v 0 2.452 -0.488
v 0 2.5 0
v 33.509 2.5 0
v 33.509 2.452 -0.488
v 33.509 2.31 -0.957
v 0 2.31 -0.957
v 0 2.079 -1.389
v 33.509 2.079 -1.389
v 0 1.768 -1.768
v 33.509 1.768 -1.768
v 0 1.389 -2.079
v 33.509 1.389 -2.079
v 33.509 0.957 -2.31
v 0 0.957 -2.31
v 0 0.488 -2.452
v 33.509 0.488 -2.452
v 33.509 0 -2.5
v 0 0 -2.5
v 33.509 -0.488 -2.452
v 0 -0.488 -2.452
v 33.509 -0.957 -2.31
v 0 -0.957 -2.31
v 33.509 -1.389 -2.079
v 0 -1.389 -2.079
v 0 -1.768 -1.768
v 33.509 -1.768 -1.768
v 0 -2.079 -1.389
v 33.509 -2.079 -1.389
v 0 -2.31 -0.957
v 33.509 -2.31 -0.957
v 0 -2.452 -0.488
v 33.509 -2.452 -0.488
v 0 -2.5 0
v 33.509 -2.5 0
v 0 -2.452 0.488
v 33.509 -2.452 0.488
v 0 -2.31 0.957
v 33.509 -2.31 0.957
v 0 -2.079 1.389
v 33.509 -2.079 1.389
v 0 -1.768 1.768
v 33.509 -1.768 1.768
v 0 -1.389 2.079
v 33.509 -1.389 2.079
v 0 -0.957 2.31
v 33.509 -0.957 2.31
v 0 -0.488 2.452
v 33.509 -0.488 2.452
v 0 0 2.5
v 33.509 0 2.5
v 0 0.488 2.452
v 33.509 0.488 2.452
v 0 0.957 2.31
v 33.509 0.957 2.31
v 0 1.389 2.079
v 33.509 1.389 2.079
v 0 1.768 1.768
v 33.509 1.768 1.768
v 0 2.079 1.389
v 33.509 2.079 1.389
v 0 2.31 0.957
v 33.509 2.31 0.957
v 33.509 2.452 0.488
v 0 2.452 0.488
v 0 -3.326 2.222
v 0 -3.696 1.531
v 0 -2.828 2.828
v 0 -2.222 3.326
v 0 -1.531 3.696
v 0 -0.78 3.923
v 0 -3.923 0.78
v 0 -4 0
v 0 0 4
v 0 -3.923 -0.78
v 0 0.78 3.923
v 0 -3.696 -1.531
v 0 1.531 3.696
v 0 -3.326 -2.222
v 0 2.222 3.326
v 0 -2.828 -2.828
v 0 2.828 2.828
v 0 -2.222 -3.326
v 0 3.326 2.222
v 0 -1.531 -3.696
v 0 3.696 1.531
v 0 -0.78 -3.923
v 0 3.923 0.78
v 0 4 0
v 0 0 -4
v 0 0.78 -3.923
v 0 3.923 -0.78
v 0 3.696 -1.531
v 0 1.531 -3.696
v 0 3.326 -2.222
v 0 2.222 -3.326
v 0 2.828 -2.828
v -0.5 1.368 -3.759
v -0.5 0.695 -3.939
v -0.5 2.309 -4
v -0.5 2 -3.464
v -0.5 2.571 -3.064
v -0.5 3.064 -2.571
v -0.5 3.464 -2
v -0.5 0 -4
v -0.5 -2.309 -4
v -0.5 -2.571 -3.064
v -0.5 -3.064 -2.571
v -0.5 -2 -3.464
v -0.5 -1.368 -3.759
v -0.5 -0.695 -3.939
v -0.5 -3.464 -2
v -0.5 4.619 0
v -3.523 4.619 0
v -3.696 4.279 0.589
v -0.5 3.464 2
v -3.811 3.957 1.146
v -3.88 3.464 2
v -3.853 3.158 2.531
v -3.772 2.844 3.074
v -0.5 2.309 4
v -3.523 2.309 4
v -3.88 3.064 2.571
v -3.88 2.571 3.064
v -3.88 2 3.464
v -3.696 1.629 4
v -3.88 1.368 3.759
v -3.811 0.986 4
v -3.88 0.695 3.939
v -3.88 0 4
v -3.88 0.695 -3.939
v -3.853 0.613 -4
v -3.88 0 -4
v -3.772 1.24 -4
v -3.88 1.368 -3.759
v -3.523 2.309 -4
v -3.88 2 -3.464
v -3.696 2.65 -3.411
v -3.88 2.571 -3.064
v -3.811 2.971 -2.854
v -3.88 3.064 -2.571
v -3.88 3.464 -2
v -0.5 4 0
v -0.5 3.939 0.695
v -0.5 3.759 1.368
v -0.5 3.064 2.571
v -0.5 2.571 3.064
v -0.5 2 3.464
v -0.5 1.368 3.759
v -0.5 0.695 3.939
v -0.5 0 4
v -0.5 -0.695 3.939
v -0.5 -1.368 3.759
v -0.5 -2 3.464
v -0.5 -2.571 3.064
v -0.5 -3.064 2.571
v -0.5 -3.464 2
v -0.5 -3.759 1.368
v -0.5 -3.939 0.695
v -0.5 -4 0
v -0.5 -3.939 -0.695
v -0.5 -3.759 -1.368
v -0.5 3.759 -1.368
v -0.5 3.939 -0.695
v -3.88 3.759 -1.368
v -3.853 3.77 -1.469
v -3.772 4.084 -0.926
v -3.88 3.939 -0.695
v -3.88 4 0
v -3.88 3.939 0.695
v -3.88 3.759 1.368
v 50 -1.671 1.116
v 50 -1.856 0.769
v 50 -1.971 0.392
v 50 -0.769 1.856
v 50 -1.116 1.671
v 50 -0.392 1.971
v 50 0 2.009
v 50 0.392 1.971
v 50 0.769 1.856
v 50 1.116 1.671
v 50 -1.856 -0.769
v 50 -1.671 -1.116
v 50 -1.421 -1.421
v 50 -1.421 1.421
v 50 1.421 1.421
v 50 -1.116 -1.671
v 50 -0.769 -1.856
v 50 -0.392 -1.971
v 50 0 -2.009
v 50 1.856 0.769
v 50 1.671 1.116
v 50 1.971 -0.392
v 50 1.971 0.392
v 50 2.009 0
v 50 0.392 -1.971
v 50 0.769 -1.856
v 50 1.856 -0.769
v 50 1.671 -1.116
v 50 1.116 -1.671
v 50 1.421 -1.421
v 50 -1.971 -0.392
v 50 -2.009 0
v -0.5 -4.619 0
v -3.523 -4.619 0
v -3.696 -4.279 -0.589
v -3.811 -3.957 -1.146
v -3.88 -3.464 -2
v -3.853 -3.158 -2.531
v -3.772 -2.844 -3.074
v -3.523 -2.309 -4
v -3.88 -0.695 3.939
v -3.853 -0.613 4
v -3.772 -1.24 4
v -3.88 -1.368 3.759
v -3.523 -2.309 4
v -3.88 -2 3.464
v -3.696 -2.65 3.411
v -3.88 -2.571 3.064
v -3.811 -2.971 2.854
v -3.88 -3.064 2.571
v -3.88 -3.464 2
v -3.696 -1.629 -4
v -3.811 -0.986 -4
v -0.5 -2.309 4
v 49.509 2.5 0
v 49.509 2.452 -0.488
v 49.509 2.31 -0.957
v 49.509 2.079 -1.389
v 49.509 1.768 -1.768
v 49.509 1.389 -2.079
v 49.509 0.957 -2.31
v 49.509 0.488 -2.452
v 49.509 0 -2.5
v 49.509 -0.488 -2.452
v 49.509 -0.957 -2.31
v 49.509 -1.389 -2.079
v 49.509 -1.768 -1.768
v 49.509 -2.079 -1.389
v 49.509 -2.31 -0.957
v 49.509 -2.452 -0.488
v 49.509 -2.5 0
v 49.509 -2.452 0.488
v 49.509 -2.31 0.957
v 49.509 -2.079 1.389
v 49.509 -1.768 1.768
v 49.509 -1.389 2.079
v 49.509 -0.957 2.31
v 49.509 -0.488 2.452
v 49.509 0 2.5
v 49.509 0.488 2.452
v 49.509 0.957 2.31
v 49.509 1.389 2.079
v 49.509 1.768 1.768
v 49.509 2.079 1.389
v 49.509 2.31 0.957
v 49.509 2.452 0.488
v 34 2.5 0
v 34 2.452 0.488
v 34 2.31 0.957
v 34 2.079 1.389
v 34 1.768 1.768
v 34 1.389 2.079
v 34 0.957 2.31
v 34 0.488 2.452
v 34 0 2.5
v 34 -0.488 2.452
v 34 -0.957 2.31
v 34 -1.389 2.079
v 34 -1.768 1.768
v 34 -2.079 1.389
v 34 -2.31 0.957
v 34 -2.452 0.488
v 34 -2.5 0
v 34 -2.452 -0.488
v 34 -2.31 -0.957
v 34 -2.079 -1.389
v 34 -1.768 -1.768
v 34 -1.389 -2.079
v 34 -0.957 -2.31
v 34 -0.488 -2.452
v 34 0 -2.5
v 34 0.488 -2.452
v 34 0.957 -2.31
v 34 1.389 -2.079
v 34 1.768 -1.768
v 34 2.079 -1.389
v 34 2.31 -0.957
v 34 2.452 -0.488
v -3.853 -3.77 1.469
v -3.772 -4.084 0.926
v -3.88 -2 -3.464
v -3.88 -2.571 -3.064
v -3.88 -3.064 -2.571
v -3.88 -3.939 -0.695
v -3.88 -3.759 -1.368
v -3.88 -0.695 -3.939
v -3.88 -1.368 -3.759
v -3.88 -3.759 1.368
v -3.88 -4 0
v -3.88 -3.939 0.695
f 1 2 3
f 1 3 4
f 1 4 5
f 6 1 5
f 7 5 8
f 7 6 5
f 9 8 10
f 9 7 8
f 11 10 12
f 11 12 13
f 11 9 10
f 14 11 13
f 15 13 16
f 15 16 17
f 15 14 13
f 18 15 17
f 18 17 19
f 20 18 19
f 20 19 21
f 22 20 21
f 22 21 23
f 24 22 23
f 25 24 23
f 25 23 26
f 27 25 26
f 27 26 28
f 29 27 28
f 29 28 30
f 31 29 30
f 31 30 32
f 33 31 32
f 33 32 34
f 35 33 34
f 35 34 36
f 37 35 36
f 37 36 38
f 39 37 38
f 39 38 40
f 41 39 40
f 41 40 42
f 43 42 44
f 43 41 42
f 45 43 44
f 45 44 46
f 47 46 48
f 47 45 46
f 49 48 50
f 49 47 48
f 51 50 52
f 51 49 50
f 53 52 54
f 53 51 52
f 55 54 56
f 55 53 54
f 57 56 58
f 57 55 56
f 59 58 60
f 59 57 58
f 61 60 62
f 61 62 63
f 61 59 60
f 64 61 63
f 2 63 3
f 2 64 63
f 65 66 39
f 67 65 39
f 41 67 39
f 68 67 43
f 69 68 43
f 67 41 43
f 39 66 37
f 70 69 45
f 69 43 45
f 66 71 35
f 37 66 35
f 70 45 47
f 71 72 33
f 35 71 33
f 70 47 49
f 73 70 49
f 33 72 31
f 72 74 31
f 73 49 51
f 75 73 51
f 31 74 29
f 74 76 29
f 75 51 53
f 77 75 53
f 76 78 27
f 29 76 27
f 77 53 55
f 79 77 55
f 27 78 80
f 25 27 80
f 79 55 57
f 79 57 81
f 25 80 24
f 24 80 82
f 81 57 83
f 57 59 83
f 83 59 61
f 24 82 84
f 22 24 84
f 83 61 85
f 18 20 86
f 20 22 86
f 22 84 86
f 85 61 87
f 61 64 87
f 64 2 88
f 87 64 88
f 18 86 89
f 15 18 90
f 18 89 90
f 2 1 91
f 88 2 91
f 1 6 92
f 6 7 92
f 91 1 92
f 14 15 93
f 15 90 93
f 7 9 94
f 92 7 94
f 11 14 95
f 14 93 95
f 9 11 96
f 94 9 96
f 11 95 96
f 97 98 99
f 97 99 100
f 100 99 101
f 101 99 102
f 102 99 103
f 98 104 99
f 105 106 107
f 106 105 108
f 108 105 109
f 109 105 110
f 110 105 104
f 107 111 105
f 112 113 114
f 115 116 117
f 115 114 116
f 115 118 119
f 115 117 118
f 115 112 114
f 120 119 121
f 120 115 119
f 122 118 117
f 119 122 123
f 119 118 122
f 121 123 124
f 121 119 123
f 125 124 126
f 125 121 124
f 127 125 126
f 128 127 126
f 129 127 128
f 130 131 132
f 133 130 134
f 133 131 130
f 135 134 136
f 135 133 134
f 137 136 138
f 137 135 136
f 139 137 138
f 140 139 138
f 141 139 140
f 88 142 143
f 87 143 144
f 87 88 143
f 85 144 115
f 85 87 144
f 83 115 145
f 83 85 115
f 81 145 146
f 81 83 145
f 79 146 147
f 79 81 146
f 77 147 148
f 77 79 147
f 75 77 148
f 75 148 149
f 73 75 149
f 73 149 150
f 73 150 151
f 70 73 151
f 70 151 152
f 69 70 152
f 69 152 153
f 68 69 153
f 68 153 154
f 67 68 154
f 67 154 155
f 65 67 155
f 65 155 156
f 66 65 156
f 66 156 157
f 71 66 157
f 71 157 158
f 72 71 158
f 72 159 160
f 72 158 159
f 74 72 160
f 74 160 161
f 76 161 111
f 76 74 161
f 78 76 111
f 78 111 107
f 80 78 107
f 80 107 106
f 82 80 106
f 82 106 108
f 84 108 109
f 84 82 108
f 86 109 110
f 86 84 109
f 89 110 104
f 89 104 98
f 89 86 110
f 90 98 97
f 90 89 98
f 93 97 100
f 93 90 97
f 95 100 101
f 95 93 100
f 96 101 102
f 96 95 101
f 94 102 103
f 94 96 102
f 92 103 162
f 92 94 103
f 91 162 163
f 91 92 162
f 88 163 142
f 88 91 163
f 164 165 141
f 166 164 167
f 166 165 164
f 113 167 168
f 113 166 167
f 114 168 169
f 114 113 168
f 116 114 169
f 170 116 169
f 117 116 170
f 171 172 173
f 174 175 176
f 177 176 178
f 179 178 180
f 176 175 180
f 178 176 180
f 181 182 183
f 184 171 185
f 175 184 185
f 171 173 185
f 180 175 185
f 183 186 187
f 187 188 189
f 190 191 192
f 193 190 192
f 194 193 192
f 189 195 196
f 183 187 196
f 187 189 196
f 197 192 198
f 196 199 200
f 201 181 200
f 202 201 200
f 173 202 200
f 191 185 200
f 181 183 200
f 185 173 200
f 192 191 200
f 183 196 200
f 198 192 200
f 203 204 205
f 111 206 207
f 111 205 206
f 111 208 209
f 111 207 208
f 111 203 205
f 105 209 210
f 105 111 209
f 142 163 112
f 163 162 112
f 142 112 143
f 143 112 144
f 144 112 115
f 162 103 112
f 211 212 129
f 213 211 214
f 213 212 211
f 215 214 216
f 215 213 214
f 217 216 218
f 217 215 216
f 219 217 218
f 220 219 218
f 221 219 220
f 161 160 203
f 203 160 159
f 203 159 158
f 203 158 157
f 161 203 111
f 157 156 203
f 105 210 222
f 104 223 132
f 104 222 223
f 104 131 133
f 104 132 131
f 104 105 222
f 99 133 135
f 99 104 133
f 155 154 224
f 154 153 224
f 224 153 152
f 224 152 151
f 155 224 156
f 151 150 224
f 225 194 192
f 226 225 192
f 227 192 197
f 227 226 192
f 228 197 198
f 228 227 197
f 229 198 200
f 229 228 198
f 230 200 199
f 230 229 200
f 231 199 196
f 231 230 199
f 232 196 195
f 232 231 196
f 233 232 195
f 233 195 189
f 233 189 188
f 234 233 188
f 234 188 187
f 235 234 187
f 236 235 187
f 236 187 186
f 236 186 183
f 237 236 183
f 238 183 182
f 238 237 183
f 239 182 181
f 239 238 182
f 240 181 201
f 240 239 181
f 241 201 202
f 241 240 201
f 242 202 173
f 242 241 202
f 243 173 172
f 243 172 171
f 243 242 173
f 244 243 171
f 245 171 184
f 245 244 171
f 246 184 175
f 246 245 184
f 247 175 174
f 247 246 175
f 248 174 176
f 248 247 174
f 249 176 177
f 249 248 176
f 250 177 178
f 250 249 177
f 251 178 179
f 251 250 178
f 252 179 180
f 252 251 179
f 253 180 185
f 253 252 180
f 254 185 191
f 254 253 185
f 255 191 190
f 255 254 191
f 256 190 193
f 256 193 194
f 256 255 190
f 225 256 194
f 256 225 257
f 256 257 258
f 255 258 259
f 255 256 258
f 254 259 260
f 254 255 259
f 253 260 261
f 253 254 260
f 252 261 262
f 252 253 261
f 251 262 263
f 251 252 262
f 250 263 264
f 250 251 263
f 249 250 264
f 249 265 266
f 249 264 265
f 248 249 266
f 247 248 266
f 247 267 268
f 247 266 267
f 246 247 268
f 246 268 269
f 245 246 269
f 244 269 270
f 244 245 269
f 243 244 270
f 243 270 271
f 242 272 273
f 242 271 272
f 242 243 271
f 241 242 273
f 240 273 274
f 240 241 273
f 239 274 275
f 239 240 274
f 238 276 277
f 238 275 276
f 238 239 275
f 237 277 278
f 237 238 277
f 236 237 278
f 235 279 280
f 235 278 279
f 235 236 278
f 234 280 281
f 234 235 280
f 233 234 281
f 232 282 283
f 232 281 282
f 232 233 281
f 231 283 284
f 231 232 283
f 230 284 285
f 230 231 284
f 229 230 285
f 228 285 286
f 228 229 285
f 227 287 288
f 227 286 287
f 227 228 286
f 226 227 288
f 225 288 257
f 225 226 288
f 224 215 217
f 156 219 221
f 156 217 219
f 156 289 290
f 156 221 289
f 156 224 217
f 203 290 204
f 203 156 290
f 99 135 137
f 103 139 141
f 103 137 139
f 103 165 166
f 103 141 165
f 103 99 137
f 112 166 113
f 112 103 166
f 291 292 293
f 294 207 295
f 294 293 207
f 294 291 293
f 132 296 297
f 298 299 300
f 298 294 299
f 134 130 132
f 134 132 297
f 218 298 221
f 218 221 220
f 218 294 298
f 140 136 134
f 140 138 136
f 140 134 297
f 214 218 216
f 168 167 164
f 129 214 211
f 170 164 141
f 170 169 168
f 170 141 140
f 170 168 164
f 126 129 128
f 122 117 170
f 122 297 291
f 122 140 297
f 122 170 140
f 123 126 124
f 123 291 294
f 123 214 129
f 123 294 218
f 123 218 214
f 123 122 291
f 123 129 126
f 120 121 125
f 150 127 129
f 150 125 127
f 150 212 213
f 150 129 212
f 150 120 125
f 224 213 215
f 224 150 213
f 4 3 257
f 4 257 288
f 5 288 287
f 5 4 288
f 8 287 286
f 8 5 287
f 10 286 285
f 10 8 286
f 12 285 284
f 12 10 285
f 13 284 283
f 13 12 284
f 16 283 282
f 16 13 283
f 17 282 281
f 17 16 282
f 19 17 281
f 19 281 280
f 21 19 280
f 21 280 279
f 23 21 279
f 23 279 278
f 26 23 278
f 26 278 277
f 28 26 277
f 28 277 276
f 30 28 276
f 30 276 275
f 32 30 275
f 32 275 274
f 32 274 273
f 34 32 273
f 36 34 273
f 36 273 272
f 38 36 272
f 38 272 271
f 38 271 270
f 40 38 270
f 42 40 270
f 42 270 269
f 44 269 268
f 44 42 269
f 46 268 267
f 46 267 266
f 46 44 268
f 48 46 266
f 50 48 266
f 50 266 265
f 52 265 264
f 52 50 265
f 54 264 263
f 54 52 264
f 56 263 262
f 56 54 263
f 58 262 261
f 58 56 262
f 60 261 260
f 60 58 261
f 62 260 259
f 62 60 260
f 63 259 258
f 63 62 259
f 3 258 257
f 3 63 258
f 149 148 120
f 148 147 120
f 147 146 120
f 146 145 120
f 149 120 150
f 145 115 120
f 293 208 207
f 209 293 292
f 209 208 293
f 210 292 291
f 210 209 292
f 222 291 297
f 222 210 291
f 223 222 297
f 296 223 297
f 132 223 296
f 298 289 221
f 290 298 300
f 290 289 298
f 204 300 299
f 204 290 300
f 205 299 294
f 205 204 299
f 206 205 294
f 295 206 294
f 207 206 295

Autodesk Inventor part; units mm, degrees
ref_plane "YZ Plane" through (0, 0, 0) normal (1, 0, 0) x (0, 1, 0)
ref_plane "XZ Plane" through (0, 0, 0) normal (0, 1, 0) x (-1, 0, 0)
sketch "Sketch1" plane through (0, 0, 0) normal (0, 0, 1) x (1, 0, 0)
  line L0 (0, 4) -> (0, 2.5)
  line L1 (34, 2.5) -> (50, 2.5)
  line L2 (50, 2.5) -> (50, 0)
  line L3 (50, 0) -> (-0.5001, 0)
  line L4 (-10.6001, 0) -> (60.1, 0) projected
  line L5 (-0.5001, 0) -> (-0.5001, 4)
  line L6 (-0.5001, 4) -> (0, 4)
  line L7 (34, 2.5) -> (33.5091, 2.5)
  line L8 (33.5091, 2.5) -> (0, 2.5)
  line L9 (0, -0.8) -> (0, 4.8) projected
  dimension "d0" = 50
  dimension "d1" = 16
  dimension "d2" = 5
  dimension "d9" = 0.5001
  dimension "d10" = 8
  dimension "d13" = 0.4909
  dimension "d14" = 5
revolve "Body" add sketch "Sketch1" angle 360 about axis through (50, 0, 0) along (-1, 0, 0)
sketch "Sketch2" plane through (-0.5001, 0, 0) normal (-1, 0, 0) x (0, 0, 1)
  line L0 (0, 4.6188) -> (4, 2.3094)
  line L1 (4, 2.3094) -> (4, -2.3094)
  line L2 (4, -2.3094) -> (0, -4.6188)
  line L3 (0, -4.6188) -> (-4, -2.3094)
  line L4 (-4, -2.3094) -> (-4, 2.3094)
  line L5 (-4, 2.3094) -> (0, 4.6188)
  point P0 (0, 0)
  point P1 (0, 0)
  dimension "d11" = 8
extrude "Head" add sketch "Sketch2" along normal blind 3.38
sketch "Sketch4" plane through (0, 0, 0) normal (0, 0, 1) x (1, 0, 0)
  line L0 (-3.8801, 4) -> (-3.8801, 4.6188)
  line L1 (-3.8801, 4.6188) -> (-3.5228, 4.6188)
  line L2 (-3.5228, 4.6188) -> (-3.8801, 4)
  line L3 (-4.5561, 0) -> (0.1759, 0) projected
  line L4 (-0.5001, 4.6188) -> (-3.8801, 4.6188) projected
  line L5 (-3.8801, 2.3094) -> (-3.8801, 4.6188) projected
  dimension "d5" = 30
  dimension "d19" = 8
revolve "Chamfer1" cut sketch "Sketch4" angle 360 about axis through (-10, 0, 0) along (1, 0, 0)
thread "Thread" size "M5x0.8" class "6g" standard "ISO Metric profile" length 16
chamfer "Chamfer2" distance 0.4908 distance2 0.4909 1 edges at (50, -2.5, 0) measured on face at (50, -0.2955, -1.5537)
ref_plane "Work Plane1" through (1.525, 0, 0) normal (0, 0, 1) x (1, 0, 0)
equation "\"d0\" = NLG"
equation "\"d1\" = GEL"
equation "\"d2\" = GD"
equation "\"d10\" = SD2"
equation "\"d14\" = BDM"
equation "\"d11\" = SW"
equation "\"d3\" = KOH - SD"
equation "\"d5\" = ANG1"
equation "\"d19\" = SW0"
equation "\"d15\" = GEL"
equation "\"d6\" = -0.5 * SPD + 0.5 * GD"
equation "\"NLG\" = 50"
equation "\"GD\" = NND"
equation "\"BDM\" = NND"
equation "\"KOH\" = 3.88"
equation "\"GEL\" = 16"
equation "\"SW\" = 8"
equation "\"SW0\" = SW"
equation "\"SPD\" = NND - 1.2269 * PTC"
equation "\"SD2\" = SW"
equation "\"SD\" = 0.5"
equation "\"ANG1\" = 30deg"
equation "\"GAL\" = 0.61345 * PTC"
equation "\"GUL\" = 0.61345 * PTC"
equation "\"RR\" = 0.2"
equation "\"WFT\" = SD"
equation "\"GD1\" = THREADDIA - 1.2269 * PTC"
equation "\"THREADDIA\" = 5"
equation "\"SDH\" = SW"
equation "\"TOA\" = 30deg"
equation "\"FAWI\" = 45deg"
equation "\"PTC\" = 0.8"
equation "\"NND\" = 5"
equation "\"E0\" = 1.155 * SW"
properties part number "AS 1111 - M5 x 50" material "Steel, Mild"
